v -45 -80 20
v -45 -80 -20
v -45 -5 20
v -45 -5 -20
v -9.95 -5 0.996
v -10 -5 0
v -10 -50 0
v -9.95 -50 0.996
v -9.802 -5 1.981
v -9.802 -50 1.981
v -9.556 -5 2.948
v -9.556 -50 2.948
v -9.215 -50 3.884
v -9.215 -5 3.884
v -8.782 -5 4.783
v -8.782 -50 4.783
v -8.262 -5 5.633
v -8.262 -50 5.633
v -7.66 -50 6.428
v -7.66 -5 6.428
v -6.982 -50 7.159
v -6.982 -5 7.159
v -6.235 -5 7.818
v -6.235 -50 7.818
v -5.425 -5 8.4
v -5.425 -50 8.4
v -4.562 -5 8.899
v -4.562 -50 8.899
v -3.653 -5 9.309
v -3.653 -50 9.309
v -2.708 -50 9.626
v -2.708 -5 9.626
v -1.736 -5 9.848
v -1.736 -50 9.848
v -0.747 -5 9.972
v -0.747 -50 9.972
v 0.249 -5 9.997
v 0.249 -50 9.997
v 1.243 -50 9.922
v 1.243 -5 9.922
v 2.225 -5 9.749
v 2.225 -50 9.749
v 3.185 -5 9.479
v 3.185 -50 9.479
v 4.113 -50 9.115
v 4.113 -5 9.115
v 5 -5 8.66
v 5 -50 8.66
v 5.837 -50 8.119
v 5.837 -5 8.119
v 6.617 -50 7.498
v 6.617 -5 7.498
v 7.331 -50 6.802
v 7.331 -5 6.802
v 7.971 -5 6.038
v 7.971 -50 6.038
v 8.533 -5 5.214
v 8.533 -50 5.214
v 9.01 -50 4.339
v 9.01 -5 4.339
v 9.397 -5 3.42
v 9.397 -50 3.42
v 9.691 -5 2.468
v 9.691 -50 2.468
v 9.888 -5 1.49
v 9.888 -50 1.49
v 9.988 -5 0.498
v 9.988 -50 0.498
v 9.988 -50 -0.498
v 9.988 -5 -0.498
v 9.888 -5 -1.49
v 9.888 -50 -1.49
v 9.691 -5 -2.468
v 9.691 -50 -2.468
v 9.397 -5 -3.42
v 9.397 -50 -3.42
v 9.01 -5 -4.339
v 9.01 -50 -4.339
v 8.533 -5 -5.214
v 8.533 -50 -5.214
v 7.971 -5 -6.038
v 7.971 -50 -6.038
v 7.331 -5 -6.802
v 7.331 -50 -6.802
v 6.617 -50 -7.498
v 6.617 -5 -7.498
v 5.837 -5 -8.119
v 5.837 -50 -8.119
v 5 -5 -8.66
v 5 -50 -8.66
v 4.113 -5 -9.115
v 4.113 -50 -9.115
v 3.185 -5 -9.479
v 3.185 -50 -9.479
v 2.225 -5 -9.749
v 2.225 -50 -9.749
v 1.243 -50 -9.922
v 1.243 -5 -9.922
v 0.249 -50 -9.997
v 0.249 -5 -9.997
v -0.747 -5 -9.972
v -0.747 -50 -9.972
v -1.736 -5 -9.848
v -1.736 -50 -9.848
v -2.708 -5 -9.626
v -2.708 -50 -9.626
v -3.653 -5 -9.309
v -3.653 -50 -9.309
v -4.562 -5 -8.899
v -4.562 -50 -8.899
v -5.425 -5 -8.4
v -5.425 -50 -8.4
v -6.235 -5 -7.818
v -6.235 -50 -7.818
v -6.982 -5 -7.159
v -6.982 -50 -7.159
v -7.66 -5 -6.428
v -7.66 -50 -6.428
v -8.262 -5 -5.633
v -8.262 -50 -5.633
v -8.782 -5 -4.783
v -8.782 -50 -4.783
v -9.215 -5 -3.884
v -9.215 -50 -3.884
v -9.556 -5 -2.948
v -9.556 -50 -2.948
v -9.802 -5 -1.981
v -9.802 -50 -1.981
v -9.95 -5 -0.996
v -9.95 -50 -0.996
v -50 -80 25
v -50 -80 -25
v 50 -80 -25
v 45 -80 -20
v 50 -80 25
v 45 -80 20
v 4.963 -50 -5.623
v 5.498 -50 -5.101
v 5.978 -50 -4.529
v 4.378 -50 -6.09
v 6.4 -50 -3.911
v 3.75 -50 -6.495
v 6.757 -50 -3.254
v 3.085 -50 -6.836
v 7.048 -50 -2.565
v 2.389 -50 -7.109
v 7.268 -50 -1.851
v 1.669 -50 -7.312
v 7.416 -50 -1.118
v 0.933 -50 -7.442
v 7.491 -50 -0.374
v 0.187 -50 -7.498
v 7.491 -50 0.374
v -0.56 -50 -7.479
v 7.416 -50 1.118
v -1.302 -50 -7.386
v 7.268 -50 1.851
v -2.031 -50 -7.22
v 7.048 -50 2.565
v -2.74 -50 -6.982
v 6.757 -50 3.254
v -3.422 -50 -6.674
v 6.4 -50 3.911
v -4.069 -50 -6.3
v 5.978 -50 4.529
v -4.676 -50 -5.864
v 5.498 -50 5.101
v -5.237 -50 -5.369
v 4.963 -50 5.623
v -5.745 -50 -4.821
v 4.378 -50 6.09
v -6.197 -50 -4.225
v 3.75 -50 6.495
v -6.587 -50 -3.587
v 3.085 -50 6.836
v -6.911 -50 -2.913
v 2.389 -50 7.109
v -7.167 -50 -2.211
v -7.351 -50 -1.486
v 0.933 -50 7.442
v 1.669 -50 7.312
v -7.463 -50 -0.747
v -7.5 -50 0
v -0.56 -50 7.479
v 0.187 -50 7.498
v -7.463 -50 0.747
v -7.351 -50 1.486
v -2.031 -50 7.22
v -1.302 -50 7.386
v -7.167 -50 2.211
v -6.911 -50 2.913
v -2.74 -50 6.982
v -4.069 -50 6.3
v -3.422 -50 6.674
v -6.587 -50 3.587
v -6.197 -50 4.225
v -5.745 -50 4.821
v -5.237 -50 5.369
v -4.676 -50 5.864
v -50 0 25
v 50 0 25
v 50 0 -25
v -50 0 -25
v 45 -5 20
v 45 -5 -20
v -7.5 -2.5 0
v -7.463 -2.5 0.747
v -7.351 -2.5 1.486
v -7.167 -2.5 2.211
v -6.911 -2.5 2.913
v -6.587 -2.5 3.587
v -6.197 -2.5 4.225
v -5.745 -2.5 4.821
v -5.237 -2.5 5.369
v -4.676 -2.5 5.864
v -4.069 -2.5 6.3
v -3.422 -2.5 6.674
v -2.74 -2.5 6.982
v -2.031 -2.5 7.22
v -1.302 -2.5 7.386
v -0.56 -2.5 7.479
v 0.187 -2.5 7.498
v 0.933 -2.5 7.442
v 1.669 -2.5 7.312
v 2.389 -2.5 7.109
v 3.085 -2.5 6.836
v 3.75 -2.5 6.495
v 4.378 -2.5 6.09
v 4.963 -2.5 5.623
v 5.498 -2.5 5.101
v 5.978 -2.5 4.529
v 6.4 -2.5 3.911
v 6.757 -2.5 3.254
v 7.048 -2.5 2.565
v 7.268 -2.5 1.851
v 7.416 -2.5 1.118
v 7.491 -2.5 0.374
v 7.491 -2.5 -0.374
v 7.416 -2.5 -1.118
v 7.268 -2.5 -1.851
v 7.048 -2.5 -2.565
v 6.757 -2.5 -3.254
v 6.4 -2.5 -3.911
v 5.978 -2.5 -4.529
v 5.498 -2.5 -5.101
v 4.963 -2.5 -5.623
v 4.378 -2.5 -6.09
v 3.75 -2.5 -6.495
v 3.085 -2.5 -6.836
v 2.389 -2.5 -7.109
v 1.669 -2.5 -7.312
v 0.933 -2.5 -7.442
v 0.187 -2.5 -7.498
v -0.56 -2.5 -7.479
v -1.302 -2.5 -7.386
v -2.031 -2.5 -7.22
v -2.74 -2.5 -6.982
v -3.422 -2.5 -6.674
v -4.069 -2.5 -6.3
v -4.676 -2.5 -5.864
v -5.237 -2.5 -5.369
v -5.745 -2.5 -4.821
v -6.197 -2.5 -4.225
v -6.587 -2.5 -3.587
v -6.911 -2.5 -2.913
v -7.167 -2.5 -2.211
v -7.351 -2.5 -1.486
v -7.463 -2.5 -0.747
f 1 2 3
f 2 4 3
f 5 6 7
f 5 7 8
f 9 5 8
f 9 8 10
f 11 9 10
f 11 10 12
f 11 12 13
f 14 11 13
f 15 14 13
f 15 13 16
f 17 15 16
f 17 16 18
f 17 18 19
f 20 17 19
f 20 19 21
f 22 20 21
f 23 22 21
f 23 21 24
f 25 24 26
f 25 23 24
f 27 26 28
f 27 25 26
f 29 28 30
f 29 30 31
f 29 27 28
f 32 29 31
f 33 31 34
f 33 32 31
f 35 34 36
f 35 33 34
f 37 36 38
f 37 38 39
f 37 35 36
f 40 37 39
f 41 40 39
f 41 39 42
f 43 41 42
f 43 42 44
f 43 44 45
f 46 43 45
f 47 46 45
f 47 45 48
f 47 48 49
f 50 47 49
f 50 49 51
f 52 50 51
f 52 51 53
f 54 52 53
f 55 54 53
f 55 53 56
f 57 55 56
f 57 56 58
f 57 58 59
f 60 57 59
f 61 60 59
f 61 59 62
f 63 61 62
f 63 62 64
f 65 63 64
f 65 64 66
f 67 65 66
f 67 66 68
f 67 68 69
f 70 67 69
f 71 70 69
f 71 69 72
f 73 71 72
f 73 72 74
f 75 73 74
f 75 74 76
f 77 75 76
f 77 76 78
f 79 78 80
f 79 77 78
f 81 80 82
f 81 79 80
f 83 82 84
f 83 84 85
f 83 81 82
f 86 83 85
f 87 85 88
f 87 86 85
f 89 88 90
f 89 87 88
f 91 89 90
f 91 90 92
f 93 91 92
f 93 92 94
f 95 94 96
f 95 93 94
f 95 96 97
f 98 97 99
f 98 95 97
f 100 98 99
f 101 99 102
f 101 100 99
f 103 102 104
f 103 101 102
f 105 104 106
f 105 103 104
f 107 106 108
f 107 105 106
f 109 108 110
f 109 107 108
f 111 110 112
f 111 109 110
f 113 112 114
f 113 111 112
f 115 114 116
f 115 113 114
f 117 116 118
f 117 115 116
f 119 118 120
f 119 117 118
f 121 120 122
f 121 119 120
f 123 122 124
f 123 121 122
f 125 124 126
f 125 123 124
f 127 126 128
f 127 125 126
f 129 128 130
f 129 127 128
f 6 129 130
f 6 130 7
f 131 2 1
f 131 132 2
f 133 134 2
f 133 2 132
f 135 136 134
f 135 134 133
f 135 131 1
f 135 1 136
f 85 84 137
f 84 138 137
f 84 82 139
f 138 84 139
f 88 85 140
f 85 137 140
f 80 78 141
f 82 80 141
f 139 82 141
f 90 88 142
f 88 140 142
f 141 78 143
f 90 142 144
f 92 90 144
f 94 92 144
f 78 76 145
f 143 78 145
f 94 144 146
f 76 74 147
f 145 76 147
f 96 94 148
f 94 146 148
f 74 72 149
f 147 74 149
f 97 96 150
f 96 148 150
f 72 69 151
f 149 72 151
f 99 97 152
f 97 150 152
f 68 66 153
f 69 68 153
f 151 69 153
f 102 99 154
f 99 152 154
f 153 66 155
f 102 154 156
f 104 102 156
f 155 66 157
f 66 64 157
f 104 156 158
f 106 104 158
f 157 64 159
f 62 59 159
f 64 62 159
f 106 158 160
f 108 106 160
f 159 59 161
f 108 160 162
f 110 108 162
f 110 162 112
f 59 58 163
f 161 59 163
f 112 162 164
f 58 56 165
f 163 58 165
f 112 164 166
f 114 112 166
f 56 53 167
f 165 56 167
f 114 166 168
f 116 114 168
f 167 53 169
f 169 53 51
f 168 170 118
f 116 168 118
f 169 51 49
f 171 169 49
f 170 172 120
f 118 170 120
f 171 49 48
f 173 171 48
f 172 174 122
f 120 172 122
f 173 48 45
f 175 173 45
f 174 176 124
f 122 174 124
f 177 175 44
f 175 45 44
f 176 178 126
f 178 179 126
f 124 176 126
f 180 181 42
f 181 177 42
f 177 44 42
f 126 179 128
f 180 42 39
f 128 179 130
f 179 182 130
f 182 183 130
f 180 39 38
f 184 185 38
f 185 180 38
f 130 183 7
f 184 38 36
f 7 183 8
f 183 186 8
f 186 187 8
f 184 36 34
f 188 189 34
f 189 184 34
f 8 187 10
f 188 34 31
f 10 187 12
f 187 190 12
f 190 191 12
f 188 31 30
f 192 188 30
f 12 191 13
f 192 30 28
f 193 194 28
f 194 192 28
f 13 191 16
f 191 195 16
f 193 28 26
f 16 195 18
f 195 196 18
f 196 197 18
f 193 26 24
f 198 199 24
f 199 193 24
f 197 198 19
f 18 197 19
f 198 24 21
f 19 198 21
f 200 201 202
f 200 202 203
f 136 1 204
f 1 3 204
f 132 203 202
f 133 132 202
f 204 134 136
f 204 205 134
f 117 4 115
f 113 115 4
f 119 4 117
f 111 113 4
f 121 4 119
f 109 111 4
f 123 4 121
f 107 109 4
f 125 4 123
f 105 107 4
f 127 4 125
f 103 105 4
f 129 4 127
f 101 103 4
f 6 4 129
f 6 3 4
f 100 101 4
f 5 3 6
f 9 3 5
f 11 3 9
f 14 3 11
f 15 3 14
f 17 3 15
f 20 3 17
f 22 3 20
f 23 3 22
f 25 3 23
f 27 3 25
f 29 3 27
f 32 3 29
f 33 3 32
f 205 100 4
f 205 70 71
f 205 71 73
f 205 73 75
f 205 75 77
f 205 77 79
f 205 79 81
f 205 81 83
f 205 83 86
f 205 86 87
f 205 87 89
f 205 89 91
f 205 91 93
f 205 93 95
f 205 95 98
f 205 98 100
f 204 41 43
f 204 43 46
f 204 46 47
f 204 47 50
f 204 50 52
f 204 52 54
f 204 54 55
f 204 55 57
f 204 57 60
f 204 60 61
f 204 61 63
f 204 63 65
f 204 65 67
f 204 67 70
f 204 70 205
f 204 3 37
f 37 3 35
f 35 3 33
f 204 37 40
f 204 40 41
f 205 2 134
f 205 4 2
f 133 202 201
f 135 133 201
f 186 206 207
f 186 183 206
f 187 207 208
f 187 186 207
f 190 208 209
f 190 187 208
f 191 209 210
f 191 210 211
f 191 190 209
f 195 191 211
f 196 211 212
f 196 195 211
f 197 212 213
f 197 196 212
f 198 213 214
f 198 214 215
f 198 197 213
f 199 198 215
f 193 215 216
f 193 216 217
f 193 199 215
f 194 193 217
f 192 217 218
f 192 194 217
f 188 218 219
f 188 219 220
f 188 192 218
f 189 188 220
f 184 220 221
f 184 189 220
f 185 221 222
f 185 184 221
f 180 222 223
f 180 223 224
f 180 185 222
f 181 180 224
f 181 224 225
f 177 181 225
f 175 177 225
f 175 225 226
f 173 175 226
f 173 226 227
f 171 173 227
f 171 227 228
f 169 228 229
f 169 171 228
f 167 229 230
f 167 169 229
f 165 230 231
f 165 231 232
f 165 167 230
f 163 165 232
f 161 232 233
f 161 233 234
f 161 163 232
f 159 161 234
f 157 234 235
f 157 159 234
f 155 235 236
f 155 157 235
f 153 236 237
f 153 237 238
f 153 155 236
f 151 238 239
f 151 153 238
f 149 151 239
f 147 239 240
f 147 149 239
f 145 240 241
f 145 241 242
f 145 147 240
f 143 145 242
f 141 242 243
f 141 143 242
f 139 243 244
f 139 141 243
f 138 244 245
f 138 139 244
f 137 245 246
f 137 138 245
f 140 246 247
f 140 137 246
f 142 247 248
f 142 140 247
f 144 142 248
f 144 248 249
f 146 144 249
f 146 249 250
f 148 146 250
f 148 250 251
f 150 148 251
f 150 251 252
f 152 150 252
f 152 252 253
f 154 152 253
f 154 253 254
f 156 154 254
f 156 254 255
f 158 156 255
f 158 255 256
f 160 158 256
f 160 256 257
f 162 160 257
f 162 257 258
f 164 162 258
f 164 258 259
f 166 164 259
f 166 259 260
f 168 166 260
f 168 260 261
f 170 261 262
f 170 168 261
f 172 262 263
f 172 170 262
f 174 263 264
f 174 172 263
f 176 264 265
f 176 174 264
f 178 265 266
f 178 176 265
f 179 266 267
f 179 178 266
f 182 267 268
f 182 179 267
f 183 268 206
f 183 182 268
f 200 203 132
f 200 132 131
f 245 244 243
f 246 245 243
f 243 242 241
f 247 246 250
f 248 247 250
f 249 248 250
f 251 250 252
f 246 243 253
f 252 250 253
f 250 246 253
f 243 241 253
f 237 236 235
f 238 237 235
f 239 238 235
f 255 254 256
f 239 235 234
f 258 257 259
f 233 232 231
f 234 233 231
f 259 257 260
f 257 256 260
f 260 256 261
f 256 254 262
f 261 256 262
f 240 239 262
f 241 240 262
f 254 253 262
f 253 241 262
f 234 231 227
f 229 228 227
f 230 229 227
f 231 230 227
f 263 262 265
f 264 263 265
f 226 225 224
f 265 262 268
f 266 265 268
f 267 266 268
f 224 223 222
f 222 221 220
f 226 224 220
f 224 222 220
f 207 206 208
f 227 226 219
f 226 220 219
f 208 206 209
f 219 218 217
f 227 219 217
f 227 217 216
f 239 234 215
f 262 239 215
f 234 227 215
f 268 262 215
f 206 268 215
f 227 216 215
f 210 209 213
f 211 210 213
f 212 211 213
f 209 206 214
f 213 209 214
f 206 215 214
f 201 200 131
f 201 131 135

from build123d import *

# Parameters (mm, degrees)
F0_W        = 100
F0_H        = 50
F1_DEPTH    = 80
F2_T        = -5
F3_R        = 10
F4_DEPTH    = 50
F5_T        = 2.5
F5_T3_DEPTH = 80
F5_T5_DEPTH = 45
F5_T7_DEPTH = 95


# Not quite as in the source:
# - a shell that OpenCascade refuses in one call is made with other operations: the cavity is built on its own and cut out


with BuildPart() as f1:
    # F0 (on Front) → F1 (new body)
    with BuildSketch(Plane.XZ):
        Rectangle(F0_W, F0_H)
    extrude(amount=F1_DEPTH)

    # F2
    f2_openings = [f1.faces().sort_by_distance(p)[0] for p in [
        (0, -80, 0),
    ]]
    offset(amount=F2_T, openings=f2_openings)

    # F3 (on face) → F4 (join)
    with BuildSketch(Plane(origin=(0, 0, 0), x_dir=(-1, 0, 0), z_dir=(0, 1, 0))):
        Circle(F3_R)
    extrude(amount=-F4_DEPTH)

    # F5: shell of thickness 2.5, made by hand


with BuildPart() as f5_core1:
    # F5_t2: copy of F1
    add(f1.part)

    # the walls: a layer under each face that stays
    f5_faces = [f5_core1.faces().sort_by_distance(p)[0] for p in [
        (-50, -40, 0),
        (0, -40, 25),
        (0, -40, -25),
        (0, 0, 0),
        (-42.8571428571, -80, -21.4285714286),
        (50, -40, 0),
        (-45, -42.5, 0),
        (0, -42.5, 20),
        (45, -42.5, 0),
        (0, -42.5, -20),
        (-30, -5, -13.3333333333),
        (10, -27.5, 0),
    ]]
    thicken(f5_faces, amount=-F5_T, mode=Mode.SUBTRACT)

    # F5_s4 → F5_t3 (cut)
    with BuildSketch(Plane.XZ.offset(2.5)):
        Polygon((-44.975, -19.975), (-47.5, -20), (-47.5, -22.5), (-45, -22.5), align=None)
        Polygon((-44.975, 19.975), (-47.5, 20), (-47.5, 22.5), (-45, 22.5), align=None)
        Polygon((44.975, 19.975), (45, 22.5), (47.5, 22.5), (47.5, 20), align=None)
        Polygon((44.975, -19.975), (47.5, -20), (47.5, -22.5), (45, -22.5), align=None)
    extrude(amount=F5_T3_DEPTH, mode=Mode.SUBTRACT)

    # F5_s6 → F5_t5 (cut)
    with BuildSketch(Plane.XY.offset(-22.5)):
        Polygon((-44.975, -5.025), (-47.5, -5), (-47.5, -2.5), (-45, -2.5), align=None)
        Polygon((44.975, -5.025), (47.5, -5), (47.5, -2.5), (45, -2.5), align=None)
    extrude(amount=F5_T5_DEPTH, mode=Mode.SUBTRACT)

    # F5_s8 → F5_t7 (cut)
    with BuildSketch(Plane.YZ.offset(-47.5)):
        Polygon((-5.025, 19.975), (-5, 22.5), (-2.5, 22.5), (-2.5, 20), align=None)
        Polygon((-5.025, -19.975), (-5, -22.5), (-2.5, -22.5), (-2.5, -20), align=None)
    extrude(amount=F5_T7_DEPTH, mode=Mode.SUBTRACT)

    # F5_s9 → F5_t10 (revolve, cut)
    with BuildSketch(Plane.XY):
        Polygon((-10.025, -5.025), (-10, -2.5), (-7.5, -2.5), (-7.5, -5), align=None)
    revolve(axis=Axis((0, -5, 0), (0, 1, 0)), mode=Mode.SUBTRACT)


with BuildPart() as f1_1:
    add(f1.part)

    # what is left inside the walls is the cavity
    f5_cavity = [f5_core1.part.solids().sort_by_distance(p)[0] for p in [
        (7.475, -18.333333, 0),
    ]]
    add(f5_cavity, mode=Mode.SUBTRACT)


solid = f1_1.part
